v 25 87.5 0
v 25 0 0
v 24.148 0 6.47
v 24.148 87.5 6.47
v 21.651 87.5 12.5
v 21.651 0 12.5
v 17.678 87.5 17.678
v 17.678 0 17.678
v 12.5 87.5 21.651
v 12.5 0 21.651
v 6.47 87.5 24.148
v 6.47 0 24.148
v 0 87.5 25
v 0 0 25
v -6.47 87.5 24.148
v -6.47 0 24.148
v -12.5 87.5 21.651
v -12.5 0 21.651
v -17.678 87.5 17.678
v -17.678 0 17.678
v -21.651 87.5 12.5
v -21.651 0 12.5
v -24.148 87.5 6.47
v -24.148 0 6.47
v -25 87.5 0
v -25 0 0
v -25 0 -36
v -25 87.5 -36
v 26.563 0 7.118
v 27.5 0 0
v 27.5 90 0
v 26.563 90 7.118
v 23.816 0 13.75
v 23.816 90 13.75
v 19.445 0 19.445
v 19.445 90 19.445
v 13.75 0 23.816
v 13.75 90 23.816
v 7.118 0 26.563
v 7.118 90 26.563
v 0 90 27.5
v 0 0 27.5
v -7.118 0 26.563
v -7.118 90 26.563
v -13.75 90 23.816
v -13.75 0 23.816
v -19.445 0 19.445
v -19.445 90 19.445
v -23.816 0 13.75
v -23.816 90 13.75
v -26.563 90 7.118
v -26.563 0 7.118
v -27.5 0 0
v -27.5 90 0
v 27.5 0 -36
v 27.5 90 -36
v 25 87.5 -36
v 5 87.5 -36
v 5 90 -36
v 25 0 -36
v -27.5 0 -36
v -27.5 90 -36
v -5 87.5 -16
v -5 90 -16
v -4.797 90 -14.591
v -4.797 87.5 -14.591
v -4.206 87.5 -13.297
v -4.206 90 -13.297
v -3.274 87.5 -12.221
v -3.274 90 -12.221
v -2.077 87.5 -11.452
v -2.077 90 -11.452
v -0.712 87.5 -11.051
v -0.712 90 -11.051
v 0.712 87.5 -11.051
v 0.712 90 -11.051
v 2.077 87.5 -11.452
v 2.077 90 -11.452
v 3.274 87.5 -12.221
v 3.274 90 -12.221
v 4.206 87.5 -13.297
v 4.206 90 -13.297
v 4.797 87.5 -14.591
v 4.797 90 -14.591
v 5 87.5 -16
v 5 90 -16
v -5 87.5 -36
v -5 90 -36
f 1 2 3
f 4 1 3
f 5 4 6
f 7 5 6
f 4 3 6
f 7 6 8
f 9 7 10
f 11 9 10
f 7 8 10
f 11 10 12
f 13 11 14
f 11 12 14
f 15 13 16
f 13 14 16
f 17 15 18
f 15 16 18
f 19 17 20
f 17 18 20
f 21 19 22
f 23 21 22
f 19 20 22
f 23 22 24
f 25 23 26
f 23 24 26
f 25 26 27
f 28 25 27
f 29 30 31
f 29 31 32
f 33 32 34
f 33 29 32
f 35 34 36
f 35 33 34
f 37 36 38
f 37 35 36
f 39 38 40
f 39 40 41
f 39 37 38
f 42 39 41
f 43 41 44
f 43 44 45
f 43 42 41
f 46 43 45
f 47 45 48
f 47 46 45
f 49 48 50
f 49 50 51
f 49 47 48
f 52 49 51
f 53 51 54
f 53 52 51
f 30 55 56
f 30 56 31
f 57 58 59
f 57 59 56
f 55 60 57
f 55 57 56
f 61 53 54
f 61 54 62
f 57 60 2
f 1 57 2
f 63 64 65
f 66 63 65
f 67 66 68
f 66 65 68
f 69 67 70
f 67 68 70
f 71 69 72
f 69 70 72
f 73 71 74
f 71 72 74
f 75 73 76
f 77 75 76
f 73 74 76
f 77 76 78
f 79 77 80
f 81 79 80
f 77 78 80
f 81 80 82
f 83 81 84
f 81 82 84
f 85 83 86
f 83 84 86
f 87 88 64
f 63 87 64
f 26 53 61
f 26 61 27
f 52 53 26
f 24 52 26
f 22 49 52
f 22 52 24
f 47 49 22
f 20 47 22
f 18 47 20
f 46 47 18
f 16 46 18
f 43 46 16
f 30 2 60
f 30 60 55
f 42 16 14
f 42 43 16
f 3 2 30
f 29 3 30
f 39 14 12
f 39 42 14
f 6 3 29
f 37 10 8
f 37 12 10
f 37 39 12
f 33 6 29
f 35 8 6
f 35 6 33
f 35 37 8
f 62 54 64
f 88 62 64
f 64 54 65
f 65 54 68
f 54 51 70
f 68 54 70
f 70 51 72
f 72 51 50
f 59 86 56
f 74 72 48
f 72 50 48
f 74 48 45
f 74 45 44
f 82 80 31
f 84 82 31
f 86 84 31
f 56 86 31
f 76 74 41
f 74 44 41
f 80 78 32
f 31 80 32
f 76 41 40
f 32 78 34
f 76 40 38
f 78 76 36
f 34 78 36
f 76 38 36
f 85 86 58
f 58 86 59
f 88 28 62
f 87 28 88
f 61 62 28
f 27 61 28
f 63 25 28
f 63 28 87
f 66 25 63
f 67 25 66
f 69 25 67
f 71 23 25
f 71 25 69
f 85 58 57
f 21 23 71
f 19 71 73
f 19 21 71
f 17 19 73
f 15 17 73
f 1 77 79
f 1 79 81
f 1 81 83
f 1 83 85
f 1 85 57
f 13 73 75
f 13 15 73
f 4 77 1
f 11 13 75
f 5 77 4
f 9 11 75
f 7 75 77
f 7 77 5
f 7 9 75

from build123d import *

# Parameters (mm, degrees)
F1_DEPTH = 90
F2_T     = -2.5
F4_DEPTH = 90.001


with BuildPart() as f1:
    # F0 (on Front) → F1 (new body)
    with BuildSketch(Plane.XZ):
        with BuildLine():
            ThreePointArc((-27.5, 0), (0, -27.5), (27.5, 0))
            ThreePointArc((27.5, 0), (0, 27.5), (-27.5, 0))
        make_face()
        with BuildLine():
            Line((27.5, -36), (27.5, 0))
            ThreePointArc((27.5, 0), (0, -27.5), (-27.5, 0))
            Line((-27.5, 0), (-27.5, -36))
            Line((-27.5, -36), (27.5, -36))
        make_face()
    extrude(amount=-F1_DEPTH)

    # F2
    f2_openings = [f1.faces().sort_by_distance(p)[0] for p in [
        (0, 0, -6.873738),
        (0, 45, -36),
    ]]
    offset(amount=F2_T, openings=f2_openings)

    # F3 (on face) → F4 (cut, through all)
    with BuildSketch(Plane(origin=(0, 90, 0), x_dir=(-1, 0, 0), z_dir=(0, 1, 0))):
        with BuildLine():
            ThreePointArc((5, -16), (0, -11), (-5, -16))
            Line((-5, -16), (-5, -36))
            Line((-5, -36), (5, -36))
            Line((5, -36), (5, -16))
        make_face()
    extrude(amount=-F4_DEPTH, mode=Mode.SUBTRACT)


solid = f1.part
